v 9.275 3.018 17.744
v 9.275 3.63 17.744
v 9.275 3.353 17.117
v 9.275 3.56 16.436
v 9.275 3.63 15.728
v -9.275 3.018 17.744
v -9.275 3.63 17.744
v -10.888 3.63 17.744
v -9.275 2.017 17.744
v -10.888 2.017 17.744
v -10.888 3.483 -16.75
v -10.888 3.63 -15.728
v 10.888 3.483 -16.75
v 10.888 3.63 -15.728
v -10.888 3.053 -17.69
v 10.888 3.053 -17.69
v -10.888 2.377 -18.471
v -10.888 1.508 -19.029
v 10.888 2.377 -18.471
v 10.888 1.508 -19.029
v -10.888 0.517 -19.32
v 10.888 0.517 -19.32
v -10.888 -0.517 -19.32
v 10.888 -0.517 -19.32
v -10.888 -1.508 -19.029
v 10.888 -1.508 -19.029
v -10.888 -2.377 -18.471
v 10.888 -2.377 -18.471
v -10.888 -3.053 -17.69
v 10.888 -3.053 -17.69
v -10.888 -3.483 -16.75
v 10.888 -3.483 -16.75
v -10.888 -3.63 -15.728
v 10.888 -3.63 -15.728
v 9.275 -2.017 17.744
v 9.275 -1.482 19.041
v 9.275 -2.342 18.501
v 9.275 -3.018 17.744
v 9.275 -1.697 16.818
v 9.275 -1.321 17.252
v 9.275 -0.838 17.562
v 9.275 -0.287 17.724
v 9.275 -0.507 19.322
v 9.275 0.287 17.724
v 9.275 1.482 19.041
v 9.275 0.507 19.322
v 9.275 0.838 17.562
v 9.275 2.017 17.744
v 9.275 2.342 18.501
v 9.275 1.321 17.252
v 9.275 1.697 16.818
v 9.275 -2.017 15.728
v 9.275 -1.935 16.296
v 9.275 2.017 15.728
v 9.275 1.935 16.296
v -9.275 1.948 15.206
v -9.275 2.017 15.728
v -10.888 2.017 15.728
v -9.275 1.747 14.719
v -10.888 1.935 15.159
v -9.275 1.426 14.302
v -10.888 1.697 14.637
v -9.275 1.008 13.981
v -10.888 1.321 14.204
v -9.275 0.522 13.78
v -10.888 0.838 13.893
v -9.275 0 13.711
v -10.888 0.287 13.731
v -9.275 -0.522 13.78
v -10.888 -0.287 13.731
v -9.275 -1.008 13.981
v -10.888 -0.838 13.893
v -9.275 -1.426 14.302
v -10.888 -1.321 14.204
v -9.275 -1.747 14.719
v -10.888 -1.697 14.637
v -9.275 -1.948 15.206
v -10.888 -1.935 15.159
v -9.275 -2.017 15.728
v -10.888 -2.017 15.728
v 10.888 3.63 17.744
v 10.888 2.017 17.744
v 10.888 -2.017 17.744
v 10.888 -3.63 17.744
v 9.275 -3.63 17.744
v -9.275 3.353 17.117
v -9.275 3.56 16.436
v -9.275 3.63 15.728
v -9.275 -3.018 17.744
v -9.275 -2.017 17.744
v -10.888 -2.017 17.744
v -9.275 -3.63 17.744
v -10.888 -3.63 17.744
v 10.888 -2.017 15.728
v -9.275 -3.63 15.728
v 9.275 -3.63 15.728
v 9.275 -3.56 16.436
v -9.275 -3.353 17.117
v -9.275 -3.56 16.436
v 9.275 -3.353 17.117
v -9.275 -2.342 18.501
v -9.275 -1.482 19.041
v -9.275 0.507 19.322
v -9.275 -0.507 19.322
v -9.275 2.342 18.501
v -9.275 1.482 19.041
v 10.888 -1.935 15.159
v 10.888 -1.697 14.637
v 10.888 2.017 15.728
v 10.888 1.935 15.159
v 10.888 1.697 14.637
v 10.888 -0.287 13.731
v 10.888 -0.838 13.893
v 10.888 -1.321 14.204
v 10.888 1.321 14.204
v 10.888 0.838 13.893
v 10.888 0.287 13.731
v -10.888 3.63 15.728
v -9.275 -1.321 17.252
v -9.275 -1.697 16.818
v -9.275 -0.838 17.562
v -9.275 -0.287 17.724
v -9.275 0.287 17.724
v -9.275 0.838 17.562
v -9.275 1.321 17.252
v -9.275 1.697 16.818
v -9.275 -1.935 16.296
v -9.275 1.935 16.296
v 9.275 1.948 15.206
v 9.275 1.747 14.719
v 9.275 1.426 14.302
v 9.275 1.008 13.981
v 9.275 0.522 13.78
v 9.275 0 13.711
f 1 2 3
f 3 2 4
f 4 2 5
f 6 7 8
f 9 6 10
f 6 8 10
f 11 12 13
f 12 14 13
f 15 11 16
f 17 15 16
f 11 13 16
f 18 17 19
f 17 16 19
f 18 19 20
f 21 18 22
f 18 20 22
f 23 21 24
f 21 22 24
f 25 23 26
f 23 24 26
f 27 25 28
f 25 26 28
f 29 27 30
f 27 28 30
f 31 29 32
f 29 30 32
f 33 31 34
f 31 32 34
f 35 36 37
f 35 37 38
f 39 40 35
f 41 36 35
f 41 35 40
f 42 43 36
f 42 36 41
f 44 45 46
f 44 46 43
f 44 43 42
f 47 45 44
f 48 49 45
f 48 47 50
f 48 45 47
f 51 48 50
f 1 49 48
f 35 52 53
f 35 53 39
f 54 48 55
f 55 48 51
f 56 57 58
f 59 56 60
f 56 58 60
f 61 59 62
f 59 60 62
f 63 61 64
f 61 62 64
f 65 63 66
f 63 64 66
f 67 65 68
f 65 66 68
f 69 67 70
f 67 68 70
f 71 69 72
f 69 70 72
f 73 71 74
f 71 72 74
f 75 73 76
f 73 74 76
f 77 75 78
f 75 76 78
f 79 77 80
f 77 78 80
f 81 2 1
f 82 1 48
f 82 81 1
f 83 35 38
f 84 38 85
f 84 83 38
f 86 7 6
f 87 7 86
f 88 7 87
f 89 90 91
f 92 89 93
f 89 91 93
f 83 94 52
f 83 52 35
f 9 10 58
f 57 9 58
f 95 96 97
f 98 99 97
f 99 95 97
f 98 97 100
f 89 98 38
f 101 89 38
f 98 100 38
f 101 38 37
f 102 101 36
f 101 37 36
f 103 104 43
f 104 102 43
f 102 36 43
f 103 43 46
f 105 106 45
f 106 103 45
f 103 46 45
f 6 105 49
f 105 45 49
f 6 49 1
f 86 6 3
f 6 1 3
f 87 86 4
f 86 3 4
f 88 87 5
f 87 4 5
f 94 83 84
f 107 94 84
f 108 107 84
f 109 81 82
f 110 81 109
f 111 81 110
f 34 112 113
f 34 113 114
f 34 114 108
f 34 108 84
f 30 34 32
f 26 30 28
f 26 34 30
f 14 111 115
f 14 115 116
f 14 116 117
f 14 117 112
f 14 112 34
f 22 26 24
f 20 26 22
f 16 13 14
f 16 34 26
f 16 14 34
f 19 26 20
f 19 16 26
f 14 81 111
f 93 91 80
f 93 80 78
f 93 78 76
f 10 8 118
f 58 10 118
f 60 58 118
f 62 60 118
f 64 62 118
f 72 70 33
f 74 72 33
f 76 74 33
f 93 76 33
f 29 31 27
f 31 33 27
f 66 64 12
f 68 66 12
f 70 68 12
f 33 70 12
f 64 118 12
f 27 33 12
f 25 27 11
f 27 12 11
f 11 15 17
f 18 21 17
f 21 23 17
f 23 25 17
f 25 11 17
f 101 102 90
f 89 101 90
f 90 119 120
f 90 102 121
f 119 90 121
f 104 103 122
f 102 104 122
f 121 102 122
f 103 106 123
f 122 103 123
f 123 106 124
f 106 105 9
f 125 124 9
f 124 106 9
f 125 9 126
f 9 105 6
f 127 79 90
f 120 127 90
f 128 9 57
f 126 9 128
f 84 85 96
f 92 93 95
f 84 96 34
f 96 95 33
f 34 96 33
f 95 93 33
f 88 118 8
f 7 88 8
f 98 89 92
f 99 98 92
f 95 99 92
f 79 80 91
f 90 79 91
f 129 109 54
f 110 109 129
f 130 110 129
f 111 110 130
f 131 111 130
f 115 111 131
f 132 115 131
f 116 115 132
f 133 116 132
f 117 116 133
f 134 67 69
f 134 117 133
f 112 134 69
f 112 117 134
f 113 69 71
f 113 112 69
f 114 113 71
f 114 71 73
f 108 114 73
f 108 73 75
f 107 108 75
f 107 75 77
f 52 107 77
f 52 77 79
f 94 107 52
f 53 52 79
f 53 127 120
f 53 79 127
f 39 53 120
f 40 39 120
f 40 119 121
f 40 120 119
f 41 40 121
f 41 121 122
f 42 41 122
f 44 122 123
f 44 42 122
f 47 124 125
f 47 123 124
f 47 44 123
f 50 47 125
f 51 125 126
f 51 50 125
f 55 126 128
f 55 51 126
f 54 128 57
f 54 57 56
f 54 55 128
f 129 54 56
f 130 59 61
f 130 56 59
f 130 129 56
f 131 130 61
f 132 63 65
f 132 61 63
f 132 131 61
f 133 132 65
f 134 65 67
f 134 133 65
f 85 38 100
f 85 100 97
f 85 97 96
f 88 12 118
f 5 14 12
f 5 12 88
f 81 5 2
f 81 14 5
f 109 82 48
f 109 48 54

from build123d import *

# Parameters (mm, degrees)
SKETCH1_R                = 2.01676
BOSS_EXTRUDE2_DEPTH      = 10.88771
BOSS_EXTRUDE2_DEPTH_BACK = 10.88771
SKETCH2_R                = 3.62966
CUT_EXTRUDE1_DEPTH       = 1.6129
BOSS_EXTRUDE3_DEPTH      = 1.6129


with BuildPart() as part:
    # Sketch1 → Boss-Extrude2 (new body, two sides)
    with BuildSketch(Plane(origin=(0, 0, 0), x_dir=(0, 0, -1), z_dir=(1, 0, 0))) as boss_extrude2_sk:
        with BuildLine():
            Line((-15.72768, 3.62966), (15.72768, 3.62966))
            ThreePointArc((15.72768, 3.62966), (19.35734, 0), (15.72768, -3.62966))
            Line((15.72768, -3.62966), (-15.72768, -3.62966))
            ThreePointArc((-15.72768, -3.62966), (-19.35734, 0), (-15.72768, 3.62966))
        make_face()
        with Locations((-15.72768, 0)):
            Circle(SKETCH1_R, mode=Mode.SUBTRACT)
    extrude(amount=BOSS_EXTRUDE2_DEPTH)
    extrude(boss_extrude2_sk.sketch, amount=-BOSS_EXTRUDE2_DEPTH_BACK)

    # Sketch2 → Cut-Extrude1 (cut)
    with BuildSketch(Plane(origin=(10.88771, 0, 0), x_dir=(0, 0, -1), z_dir=(1, 0, 0))):
        with Locations((-15.72768, 0)):
            Circle(SKETCH2_R)
    cut_extrude1 = extrude(amount=-CUT_EXTRUDE1_DEPTH, mode=Mode.SUBTRACT)

    # Mirror1: Cut-Extrude1 across plane
    add(cut_extrude1.mirror(Plane(origin=(0, 0, 0), x_dir=(0, 0, 1), z_dir=(1, 0, 0))), mode=Mode.SUBTRACT)

    # Sketch3 → Boss-Extrude3 (add)
    with BuildSketch(Plane(origin=(10.88771, 0, 0), x_dir=(0, 0, -1), z_dir=(1, 0, 0))):
        with BuildLine():
            Line((-17.74444, -2.01676), (-17.74444, -3.62966))
            Line((-17.74444, -3.62966), (-15.72768, -3.62966))
            ThreePointArc((-15.72768, -3.62966), (-12.09802, 0), (-15.72768, 3.62966))
            Line((-15.72768, 3.62966), (-17.74444, 3.62966))
            Line((-17.74444, 3.62966), (-17.74444, 2.01676))
            Line((-17.74444, 2.01676), (-15.72768, 2.01676))
            ThreePointArc((-15.72768, 2.01676), (-13.71092, 0), (-15.72768, -2.01676))
            Line((-15.72768, -2.01676), (-17.74444, -2.01676))
        make_face()
    boss_extrude3 = extrude(amount=-BOSS_EXTRUDE3_DEPTH)

    # Mirror2: Boss-Extrude3 across plane
    add(boss_extrude3.mirror(Plane(origin=(0, 0, 0), x_dir=(0, 0, 1), z_dir=(1, 0, 0))))


solid = part.part
